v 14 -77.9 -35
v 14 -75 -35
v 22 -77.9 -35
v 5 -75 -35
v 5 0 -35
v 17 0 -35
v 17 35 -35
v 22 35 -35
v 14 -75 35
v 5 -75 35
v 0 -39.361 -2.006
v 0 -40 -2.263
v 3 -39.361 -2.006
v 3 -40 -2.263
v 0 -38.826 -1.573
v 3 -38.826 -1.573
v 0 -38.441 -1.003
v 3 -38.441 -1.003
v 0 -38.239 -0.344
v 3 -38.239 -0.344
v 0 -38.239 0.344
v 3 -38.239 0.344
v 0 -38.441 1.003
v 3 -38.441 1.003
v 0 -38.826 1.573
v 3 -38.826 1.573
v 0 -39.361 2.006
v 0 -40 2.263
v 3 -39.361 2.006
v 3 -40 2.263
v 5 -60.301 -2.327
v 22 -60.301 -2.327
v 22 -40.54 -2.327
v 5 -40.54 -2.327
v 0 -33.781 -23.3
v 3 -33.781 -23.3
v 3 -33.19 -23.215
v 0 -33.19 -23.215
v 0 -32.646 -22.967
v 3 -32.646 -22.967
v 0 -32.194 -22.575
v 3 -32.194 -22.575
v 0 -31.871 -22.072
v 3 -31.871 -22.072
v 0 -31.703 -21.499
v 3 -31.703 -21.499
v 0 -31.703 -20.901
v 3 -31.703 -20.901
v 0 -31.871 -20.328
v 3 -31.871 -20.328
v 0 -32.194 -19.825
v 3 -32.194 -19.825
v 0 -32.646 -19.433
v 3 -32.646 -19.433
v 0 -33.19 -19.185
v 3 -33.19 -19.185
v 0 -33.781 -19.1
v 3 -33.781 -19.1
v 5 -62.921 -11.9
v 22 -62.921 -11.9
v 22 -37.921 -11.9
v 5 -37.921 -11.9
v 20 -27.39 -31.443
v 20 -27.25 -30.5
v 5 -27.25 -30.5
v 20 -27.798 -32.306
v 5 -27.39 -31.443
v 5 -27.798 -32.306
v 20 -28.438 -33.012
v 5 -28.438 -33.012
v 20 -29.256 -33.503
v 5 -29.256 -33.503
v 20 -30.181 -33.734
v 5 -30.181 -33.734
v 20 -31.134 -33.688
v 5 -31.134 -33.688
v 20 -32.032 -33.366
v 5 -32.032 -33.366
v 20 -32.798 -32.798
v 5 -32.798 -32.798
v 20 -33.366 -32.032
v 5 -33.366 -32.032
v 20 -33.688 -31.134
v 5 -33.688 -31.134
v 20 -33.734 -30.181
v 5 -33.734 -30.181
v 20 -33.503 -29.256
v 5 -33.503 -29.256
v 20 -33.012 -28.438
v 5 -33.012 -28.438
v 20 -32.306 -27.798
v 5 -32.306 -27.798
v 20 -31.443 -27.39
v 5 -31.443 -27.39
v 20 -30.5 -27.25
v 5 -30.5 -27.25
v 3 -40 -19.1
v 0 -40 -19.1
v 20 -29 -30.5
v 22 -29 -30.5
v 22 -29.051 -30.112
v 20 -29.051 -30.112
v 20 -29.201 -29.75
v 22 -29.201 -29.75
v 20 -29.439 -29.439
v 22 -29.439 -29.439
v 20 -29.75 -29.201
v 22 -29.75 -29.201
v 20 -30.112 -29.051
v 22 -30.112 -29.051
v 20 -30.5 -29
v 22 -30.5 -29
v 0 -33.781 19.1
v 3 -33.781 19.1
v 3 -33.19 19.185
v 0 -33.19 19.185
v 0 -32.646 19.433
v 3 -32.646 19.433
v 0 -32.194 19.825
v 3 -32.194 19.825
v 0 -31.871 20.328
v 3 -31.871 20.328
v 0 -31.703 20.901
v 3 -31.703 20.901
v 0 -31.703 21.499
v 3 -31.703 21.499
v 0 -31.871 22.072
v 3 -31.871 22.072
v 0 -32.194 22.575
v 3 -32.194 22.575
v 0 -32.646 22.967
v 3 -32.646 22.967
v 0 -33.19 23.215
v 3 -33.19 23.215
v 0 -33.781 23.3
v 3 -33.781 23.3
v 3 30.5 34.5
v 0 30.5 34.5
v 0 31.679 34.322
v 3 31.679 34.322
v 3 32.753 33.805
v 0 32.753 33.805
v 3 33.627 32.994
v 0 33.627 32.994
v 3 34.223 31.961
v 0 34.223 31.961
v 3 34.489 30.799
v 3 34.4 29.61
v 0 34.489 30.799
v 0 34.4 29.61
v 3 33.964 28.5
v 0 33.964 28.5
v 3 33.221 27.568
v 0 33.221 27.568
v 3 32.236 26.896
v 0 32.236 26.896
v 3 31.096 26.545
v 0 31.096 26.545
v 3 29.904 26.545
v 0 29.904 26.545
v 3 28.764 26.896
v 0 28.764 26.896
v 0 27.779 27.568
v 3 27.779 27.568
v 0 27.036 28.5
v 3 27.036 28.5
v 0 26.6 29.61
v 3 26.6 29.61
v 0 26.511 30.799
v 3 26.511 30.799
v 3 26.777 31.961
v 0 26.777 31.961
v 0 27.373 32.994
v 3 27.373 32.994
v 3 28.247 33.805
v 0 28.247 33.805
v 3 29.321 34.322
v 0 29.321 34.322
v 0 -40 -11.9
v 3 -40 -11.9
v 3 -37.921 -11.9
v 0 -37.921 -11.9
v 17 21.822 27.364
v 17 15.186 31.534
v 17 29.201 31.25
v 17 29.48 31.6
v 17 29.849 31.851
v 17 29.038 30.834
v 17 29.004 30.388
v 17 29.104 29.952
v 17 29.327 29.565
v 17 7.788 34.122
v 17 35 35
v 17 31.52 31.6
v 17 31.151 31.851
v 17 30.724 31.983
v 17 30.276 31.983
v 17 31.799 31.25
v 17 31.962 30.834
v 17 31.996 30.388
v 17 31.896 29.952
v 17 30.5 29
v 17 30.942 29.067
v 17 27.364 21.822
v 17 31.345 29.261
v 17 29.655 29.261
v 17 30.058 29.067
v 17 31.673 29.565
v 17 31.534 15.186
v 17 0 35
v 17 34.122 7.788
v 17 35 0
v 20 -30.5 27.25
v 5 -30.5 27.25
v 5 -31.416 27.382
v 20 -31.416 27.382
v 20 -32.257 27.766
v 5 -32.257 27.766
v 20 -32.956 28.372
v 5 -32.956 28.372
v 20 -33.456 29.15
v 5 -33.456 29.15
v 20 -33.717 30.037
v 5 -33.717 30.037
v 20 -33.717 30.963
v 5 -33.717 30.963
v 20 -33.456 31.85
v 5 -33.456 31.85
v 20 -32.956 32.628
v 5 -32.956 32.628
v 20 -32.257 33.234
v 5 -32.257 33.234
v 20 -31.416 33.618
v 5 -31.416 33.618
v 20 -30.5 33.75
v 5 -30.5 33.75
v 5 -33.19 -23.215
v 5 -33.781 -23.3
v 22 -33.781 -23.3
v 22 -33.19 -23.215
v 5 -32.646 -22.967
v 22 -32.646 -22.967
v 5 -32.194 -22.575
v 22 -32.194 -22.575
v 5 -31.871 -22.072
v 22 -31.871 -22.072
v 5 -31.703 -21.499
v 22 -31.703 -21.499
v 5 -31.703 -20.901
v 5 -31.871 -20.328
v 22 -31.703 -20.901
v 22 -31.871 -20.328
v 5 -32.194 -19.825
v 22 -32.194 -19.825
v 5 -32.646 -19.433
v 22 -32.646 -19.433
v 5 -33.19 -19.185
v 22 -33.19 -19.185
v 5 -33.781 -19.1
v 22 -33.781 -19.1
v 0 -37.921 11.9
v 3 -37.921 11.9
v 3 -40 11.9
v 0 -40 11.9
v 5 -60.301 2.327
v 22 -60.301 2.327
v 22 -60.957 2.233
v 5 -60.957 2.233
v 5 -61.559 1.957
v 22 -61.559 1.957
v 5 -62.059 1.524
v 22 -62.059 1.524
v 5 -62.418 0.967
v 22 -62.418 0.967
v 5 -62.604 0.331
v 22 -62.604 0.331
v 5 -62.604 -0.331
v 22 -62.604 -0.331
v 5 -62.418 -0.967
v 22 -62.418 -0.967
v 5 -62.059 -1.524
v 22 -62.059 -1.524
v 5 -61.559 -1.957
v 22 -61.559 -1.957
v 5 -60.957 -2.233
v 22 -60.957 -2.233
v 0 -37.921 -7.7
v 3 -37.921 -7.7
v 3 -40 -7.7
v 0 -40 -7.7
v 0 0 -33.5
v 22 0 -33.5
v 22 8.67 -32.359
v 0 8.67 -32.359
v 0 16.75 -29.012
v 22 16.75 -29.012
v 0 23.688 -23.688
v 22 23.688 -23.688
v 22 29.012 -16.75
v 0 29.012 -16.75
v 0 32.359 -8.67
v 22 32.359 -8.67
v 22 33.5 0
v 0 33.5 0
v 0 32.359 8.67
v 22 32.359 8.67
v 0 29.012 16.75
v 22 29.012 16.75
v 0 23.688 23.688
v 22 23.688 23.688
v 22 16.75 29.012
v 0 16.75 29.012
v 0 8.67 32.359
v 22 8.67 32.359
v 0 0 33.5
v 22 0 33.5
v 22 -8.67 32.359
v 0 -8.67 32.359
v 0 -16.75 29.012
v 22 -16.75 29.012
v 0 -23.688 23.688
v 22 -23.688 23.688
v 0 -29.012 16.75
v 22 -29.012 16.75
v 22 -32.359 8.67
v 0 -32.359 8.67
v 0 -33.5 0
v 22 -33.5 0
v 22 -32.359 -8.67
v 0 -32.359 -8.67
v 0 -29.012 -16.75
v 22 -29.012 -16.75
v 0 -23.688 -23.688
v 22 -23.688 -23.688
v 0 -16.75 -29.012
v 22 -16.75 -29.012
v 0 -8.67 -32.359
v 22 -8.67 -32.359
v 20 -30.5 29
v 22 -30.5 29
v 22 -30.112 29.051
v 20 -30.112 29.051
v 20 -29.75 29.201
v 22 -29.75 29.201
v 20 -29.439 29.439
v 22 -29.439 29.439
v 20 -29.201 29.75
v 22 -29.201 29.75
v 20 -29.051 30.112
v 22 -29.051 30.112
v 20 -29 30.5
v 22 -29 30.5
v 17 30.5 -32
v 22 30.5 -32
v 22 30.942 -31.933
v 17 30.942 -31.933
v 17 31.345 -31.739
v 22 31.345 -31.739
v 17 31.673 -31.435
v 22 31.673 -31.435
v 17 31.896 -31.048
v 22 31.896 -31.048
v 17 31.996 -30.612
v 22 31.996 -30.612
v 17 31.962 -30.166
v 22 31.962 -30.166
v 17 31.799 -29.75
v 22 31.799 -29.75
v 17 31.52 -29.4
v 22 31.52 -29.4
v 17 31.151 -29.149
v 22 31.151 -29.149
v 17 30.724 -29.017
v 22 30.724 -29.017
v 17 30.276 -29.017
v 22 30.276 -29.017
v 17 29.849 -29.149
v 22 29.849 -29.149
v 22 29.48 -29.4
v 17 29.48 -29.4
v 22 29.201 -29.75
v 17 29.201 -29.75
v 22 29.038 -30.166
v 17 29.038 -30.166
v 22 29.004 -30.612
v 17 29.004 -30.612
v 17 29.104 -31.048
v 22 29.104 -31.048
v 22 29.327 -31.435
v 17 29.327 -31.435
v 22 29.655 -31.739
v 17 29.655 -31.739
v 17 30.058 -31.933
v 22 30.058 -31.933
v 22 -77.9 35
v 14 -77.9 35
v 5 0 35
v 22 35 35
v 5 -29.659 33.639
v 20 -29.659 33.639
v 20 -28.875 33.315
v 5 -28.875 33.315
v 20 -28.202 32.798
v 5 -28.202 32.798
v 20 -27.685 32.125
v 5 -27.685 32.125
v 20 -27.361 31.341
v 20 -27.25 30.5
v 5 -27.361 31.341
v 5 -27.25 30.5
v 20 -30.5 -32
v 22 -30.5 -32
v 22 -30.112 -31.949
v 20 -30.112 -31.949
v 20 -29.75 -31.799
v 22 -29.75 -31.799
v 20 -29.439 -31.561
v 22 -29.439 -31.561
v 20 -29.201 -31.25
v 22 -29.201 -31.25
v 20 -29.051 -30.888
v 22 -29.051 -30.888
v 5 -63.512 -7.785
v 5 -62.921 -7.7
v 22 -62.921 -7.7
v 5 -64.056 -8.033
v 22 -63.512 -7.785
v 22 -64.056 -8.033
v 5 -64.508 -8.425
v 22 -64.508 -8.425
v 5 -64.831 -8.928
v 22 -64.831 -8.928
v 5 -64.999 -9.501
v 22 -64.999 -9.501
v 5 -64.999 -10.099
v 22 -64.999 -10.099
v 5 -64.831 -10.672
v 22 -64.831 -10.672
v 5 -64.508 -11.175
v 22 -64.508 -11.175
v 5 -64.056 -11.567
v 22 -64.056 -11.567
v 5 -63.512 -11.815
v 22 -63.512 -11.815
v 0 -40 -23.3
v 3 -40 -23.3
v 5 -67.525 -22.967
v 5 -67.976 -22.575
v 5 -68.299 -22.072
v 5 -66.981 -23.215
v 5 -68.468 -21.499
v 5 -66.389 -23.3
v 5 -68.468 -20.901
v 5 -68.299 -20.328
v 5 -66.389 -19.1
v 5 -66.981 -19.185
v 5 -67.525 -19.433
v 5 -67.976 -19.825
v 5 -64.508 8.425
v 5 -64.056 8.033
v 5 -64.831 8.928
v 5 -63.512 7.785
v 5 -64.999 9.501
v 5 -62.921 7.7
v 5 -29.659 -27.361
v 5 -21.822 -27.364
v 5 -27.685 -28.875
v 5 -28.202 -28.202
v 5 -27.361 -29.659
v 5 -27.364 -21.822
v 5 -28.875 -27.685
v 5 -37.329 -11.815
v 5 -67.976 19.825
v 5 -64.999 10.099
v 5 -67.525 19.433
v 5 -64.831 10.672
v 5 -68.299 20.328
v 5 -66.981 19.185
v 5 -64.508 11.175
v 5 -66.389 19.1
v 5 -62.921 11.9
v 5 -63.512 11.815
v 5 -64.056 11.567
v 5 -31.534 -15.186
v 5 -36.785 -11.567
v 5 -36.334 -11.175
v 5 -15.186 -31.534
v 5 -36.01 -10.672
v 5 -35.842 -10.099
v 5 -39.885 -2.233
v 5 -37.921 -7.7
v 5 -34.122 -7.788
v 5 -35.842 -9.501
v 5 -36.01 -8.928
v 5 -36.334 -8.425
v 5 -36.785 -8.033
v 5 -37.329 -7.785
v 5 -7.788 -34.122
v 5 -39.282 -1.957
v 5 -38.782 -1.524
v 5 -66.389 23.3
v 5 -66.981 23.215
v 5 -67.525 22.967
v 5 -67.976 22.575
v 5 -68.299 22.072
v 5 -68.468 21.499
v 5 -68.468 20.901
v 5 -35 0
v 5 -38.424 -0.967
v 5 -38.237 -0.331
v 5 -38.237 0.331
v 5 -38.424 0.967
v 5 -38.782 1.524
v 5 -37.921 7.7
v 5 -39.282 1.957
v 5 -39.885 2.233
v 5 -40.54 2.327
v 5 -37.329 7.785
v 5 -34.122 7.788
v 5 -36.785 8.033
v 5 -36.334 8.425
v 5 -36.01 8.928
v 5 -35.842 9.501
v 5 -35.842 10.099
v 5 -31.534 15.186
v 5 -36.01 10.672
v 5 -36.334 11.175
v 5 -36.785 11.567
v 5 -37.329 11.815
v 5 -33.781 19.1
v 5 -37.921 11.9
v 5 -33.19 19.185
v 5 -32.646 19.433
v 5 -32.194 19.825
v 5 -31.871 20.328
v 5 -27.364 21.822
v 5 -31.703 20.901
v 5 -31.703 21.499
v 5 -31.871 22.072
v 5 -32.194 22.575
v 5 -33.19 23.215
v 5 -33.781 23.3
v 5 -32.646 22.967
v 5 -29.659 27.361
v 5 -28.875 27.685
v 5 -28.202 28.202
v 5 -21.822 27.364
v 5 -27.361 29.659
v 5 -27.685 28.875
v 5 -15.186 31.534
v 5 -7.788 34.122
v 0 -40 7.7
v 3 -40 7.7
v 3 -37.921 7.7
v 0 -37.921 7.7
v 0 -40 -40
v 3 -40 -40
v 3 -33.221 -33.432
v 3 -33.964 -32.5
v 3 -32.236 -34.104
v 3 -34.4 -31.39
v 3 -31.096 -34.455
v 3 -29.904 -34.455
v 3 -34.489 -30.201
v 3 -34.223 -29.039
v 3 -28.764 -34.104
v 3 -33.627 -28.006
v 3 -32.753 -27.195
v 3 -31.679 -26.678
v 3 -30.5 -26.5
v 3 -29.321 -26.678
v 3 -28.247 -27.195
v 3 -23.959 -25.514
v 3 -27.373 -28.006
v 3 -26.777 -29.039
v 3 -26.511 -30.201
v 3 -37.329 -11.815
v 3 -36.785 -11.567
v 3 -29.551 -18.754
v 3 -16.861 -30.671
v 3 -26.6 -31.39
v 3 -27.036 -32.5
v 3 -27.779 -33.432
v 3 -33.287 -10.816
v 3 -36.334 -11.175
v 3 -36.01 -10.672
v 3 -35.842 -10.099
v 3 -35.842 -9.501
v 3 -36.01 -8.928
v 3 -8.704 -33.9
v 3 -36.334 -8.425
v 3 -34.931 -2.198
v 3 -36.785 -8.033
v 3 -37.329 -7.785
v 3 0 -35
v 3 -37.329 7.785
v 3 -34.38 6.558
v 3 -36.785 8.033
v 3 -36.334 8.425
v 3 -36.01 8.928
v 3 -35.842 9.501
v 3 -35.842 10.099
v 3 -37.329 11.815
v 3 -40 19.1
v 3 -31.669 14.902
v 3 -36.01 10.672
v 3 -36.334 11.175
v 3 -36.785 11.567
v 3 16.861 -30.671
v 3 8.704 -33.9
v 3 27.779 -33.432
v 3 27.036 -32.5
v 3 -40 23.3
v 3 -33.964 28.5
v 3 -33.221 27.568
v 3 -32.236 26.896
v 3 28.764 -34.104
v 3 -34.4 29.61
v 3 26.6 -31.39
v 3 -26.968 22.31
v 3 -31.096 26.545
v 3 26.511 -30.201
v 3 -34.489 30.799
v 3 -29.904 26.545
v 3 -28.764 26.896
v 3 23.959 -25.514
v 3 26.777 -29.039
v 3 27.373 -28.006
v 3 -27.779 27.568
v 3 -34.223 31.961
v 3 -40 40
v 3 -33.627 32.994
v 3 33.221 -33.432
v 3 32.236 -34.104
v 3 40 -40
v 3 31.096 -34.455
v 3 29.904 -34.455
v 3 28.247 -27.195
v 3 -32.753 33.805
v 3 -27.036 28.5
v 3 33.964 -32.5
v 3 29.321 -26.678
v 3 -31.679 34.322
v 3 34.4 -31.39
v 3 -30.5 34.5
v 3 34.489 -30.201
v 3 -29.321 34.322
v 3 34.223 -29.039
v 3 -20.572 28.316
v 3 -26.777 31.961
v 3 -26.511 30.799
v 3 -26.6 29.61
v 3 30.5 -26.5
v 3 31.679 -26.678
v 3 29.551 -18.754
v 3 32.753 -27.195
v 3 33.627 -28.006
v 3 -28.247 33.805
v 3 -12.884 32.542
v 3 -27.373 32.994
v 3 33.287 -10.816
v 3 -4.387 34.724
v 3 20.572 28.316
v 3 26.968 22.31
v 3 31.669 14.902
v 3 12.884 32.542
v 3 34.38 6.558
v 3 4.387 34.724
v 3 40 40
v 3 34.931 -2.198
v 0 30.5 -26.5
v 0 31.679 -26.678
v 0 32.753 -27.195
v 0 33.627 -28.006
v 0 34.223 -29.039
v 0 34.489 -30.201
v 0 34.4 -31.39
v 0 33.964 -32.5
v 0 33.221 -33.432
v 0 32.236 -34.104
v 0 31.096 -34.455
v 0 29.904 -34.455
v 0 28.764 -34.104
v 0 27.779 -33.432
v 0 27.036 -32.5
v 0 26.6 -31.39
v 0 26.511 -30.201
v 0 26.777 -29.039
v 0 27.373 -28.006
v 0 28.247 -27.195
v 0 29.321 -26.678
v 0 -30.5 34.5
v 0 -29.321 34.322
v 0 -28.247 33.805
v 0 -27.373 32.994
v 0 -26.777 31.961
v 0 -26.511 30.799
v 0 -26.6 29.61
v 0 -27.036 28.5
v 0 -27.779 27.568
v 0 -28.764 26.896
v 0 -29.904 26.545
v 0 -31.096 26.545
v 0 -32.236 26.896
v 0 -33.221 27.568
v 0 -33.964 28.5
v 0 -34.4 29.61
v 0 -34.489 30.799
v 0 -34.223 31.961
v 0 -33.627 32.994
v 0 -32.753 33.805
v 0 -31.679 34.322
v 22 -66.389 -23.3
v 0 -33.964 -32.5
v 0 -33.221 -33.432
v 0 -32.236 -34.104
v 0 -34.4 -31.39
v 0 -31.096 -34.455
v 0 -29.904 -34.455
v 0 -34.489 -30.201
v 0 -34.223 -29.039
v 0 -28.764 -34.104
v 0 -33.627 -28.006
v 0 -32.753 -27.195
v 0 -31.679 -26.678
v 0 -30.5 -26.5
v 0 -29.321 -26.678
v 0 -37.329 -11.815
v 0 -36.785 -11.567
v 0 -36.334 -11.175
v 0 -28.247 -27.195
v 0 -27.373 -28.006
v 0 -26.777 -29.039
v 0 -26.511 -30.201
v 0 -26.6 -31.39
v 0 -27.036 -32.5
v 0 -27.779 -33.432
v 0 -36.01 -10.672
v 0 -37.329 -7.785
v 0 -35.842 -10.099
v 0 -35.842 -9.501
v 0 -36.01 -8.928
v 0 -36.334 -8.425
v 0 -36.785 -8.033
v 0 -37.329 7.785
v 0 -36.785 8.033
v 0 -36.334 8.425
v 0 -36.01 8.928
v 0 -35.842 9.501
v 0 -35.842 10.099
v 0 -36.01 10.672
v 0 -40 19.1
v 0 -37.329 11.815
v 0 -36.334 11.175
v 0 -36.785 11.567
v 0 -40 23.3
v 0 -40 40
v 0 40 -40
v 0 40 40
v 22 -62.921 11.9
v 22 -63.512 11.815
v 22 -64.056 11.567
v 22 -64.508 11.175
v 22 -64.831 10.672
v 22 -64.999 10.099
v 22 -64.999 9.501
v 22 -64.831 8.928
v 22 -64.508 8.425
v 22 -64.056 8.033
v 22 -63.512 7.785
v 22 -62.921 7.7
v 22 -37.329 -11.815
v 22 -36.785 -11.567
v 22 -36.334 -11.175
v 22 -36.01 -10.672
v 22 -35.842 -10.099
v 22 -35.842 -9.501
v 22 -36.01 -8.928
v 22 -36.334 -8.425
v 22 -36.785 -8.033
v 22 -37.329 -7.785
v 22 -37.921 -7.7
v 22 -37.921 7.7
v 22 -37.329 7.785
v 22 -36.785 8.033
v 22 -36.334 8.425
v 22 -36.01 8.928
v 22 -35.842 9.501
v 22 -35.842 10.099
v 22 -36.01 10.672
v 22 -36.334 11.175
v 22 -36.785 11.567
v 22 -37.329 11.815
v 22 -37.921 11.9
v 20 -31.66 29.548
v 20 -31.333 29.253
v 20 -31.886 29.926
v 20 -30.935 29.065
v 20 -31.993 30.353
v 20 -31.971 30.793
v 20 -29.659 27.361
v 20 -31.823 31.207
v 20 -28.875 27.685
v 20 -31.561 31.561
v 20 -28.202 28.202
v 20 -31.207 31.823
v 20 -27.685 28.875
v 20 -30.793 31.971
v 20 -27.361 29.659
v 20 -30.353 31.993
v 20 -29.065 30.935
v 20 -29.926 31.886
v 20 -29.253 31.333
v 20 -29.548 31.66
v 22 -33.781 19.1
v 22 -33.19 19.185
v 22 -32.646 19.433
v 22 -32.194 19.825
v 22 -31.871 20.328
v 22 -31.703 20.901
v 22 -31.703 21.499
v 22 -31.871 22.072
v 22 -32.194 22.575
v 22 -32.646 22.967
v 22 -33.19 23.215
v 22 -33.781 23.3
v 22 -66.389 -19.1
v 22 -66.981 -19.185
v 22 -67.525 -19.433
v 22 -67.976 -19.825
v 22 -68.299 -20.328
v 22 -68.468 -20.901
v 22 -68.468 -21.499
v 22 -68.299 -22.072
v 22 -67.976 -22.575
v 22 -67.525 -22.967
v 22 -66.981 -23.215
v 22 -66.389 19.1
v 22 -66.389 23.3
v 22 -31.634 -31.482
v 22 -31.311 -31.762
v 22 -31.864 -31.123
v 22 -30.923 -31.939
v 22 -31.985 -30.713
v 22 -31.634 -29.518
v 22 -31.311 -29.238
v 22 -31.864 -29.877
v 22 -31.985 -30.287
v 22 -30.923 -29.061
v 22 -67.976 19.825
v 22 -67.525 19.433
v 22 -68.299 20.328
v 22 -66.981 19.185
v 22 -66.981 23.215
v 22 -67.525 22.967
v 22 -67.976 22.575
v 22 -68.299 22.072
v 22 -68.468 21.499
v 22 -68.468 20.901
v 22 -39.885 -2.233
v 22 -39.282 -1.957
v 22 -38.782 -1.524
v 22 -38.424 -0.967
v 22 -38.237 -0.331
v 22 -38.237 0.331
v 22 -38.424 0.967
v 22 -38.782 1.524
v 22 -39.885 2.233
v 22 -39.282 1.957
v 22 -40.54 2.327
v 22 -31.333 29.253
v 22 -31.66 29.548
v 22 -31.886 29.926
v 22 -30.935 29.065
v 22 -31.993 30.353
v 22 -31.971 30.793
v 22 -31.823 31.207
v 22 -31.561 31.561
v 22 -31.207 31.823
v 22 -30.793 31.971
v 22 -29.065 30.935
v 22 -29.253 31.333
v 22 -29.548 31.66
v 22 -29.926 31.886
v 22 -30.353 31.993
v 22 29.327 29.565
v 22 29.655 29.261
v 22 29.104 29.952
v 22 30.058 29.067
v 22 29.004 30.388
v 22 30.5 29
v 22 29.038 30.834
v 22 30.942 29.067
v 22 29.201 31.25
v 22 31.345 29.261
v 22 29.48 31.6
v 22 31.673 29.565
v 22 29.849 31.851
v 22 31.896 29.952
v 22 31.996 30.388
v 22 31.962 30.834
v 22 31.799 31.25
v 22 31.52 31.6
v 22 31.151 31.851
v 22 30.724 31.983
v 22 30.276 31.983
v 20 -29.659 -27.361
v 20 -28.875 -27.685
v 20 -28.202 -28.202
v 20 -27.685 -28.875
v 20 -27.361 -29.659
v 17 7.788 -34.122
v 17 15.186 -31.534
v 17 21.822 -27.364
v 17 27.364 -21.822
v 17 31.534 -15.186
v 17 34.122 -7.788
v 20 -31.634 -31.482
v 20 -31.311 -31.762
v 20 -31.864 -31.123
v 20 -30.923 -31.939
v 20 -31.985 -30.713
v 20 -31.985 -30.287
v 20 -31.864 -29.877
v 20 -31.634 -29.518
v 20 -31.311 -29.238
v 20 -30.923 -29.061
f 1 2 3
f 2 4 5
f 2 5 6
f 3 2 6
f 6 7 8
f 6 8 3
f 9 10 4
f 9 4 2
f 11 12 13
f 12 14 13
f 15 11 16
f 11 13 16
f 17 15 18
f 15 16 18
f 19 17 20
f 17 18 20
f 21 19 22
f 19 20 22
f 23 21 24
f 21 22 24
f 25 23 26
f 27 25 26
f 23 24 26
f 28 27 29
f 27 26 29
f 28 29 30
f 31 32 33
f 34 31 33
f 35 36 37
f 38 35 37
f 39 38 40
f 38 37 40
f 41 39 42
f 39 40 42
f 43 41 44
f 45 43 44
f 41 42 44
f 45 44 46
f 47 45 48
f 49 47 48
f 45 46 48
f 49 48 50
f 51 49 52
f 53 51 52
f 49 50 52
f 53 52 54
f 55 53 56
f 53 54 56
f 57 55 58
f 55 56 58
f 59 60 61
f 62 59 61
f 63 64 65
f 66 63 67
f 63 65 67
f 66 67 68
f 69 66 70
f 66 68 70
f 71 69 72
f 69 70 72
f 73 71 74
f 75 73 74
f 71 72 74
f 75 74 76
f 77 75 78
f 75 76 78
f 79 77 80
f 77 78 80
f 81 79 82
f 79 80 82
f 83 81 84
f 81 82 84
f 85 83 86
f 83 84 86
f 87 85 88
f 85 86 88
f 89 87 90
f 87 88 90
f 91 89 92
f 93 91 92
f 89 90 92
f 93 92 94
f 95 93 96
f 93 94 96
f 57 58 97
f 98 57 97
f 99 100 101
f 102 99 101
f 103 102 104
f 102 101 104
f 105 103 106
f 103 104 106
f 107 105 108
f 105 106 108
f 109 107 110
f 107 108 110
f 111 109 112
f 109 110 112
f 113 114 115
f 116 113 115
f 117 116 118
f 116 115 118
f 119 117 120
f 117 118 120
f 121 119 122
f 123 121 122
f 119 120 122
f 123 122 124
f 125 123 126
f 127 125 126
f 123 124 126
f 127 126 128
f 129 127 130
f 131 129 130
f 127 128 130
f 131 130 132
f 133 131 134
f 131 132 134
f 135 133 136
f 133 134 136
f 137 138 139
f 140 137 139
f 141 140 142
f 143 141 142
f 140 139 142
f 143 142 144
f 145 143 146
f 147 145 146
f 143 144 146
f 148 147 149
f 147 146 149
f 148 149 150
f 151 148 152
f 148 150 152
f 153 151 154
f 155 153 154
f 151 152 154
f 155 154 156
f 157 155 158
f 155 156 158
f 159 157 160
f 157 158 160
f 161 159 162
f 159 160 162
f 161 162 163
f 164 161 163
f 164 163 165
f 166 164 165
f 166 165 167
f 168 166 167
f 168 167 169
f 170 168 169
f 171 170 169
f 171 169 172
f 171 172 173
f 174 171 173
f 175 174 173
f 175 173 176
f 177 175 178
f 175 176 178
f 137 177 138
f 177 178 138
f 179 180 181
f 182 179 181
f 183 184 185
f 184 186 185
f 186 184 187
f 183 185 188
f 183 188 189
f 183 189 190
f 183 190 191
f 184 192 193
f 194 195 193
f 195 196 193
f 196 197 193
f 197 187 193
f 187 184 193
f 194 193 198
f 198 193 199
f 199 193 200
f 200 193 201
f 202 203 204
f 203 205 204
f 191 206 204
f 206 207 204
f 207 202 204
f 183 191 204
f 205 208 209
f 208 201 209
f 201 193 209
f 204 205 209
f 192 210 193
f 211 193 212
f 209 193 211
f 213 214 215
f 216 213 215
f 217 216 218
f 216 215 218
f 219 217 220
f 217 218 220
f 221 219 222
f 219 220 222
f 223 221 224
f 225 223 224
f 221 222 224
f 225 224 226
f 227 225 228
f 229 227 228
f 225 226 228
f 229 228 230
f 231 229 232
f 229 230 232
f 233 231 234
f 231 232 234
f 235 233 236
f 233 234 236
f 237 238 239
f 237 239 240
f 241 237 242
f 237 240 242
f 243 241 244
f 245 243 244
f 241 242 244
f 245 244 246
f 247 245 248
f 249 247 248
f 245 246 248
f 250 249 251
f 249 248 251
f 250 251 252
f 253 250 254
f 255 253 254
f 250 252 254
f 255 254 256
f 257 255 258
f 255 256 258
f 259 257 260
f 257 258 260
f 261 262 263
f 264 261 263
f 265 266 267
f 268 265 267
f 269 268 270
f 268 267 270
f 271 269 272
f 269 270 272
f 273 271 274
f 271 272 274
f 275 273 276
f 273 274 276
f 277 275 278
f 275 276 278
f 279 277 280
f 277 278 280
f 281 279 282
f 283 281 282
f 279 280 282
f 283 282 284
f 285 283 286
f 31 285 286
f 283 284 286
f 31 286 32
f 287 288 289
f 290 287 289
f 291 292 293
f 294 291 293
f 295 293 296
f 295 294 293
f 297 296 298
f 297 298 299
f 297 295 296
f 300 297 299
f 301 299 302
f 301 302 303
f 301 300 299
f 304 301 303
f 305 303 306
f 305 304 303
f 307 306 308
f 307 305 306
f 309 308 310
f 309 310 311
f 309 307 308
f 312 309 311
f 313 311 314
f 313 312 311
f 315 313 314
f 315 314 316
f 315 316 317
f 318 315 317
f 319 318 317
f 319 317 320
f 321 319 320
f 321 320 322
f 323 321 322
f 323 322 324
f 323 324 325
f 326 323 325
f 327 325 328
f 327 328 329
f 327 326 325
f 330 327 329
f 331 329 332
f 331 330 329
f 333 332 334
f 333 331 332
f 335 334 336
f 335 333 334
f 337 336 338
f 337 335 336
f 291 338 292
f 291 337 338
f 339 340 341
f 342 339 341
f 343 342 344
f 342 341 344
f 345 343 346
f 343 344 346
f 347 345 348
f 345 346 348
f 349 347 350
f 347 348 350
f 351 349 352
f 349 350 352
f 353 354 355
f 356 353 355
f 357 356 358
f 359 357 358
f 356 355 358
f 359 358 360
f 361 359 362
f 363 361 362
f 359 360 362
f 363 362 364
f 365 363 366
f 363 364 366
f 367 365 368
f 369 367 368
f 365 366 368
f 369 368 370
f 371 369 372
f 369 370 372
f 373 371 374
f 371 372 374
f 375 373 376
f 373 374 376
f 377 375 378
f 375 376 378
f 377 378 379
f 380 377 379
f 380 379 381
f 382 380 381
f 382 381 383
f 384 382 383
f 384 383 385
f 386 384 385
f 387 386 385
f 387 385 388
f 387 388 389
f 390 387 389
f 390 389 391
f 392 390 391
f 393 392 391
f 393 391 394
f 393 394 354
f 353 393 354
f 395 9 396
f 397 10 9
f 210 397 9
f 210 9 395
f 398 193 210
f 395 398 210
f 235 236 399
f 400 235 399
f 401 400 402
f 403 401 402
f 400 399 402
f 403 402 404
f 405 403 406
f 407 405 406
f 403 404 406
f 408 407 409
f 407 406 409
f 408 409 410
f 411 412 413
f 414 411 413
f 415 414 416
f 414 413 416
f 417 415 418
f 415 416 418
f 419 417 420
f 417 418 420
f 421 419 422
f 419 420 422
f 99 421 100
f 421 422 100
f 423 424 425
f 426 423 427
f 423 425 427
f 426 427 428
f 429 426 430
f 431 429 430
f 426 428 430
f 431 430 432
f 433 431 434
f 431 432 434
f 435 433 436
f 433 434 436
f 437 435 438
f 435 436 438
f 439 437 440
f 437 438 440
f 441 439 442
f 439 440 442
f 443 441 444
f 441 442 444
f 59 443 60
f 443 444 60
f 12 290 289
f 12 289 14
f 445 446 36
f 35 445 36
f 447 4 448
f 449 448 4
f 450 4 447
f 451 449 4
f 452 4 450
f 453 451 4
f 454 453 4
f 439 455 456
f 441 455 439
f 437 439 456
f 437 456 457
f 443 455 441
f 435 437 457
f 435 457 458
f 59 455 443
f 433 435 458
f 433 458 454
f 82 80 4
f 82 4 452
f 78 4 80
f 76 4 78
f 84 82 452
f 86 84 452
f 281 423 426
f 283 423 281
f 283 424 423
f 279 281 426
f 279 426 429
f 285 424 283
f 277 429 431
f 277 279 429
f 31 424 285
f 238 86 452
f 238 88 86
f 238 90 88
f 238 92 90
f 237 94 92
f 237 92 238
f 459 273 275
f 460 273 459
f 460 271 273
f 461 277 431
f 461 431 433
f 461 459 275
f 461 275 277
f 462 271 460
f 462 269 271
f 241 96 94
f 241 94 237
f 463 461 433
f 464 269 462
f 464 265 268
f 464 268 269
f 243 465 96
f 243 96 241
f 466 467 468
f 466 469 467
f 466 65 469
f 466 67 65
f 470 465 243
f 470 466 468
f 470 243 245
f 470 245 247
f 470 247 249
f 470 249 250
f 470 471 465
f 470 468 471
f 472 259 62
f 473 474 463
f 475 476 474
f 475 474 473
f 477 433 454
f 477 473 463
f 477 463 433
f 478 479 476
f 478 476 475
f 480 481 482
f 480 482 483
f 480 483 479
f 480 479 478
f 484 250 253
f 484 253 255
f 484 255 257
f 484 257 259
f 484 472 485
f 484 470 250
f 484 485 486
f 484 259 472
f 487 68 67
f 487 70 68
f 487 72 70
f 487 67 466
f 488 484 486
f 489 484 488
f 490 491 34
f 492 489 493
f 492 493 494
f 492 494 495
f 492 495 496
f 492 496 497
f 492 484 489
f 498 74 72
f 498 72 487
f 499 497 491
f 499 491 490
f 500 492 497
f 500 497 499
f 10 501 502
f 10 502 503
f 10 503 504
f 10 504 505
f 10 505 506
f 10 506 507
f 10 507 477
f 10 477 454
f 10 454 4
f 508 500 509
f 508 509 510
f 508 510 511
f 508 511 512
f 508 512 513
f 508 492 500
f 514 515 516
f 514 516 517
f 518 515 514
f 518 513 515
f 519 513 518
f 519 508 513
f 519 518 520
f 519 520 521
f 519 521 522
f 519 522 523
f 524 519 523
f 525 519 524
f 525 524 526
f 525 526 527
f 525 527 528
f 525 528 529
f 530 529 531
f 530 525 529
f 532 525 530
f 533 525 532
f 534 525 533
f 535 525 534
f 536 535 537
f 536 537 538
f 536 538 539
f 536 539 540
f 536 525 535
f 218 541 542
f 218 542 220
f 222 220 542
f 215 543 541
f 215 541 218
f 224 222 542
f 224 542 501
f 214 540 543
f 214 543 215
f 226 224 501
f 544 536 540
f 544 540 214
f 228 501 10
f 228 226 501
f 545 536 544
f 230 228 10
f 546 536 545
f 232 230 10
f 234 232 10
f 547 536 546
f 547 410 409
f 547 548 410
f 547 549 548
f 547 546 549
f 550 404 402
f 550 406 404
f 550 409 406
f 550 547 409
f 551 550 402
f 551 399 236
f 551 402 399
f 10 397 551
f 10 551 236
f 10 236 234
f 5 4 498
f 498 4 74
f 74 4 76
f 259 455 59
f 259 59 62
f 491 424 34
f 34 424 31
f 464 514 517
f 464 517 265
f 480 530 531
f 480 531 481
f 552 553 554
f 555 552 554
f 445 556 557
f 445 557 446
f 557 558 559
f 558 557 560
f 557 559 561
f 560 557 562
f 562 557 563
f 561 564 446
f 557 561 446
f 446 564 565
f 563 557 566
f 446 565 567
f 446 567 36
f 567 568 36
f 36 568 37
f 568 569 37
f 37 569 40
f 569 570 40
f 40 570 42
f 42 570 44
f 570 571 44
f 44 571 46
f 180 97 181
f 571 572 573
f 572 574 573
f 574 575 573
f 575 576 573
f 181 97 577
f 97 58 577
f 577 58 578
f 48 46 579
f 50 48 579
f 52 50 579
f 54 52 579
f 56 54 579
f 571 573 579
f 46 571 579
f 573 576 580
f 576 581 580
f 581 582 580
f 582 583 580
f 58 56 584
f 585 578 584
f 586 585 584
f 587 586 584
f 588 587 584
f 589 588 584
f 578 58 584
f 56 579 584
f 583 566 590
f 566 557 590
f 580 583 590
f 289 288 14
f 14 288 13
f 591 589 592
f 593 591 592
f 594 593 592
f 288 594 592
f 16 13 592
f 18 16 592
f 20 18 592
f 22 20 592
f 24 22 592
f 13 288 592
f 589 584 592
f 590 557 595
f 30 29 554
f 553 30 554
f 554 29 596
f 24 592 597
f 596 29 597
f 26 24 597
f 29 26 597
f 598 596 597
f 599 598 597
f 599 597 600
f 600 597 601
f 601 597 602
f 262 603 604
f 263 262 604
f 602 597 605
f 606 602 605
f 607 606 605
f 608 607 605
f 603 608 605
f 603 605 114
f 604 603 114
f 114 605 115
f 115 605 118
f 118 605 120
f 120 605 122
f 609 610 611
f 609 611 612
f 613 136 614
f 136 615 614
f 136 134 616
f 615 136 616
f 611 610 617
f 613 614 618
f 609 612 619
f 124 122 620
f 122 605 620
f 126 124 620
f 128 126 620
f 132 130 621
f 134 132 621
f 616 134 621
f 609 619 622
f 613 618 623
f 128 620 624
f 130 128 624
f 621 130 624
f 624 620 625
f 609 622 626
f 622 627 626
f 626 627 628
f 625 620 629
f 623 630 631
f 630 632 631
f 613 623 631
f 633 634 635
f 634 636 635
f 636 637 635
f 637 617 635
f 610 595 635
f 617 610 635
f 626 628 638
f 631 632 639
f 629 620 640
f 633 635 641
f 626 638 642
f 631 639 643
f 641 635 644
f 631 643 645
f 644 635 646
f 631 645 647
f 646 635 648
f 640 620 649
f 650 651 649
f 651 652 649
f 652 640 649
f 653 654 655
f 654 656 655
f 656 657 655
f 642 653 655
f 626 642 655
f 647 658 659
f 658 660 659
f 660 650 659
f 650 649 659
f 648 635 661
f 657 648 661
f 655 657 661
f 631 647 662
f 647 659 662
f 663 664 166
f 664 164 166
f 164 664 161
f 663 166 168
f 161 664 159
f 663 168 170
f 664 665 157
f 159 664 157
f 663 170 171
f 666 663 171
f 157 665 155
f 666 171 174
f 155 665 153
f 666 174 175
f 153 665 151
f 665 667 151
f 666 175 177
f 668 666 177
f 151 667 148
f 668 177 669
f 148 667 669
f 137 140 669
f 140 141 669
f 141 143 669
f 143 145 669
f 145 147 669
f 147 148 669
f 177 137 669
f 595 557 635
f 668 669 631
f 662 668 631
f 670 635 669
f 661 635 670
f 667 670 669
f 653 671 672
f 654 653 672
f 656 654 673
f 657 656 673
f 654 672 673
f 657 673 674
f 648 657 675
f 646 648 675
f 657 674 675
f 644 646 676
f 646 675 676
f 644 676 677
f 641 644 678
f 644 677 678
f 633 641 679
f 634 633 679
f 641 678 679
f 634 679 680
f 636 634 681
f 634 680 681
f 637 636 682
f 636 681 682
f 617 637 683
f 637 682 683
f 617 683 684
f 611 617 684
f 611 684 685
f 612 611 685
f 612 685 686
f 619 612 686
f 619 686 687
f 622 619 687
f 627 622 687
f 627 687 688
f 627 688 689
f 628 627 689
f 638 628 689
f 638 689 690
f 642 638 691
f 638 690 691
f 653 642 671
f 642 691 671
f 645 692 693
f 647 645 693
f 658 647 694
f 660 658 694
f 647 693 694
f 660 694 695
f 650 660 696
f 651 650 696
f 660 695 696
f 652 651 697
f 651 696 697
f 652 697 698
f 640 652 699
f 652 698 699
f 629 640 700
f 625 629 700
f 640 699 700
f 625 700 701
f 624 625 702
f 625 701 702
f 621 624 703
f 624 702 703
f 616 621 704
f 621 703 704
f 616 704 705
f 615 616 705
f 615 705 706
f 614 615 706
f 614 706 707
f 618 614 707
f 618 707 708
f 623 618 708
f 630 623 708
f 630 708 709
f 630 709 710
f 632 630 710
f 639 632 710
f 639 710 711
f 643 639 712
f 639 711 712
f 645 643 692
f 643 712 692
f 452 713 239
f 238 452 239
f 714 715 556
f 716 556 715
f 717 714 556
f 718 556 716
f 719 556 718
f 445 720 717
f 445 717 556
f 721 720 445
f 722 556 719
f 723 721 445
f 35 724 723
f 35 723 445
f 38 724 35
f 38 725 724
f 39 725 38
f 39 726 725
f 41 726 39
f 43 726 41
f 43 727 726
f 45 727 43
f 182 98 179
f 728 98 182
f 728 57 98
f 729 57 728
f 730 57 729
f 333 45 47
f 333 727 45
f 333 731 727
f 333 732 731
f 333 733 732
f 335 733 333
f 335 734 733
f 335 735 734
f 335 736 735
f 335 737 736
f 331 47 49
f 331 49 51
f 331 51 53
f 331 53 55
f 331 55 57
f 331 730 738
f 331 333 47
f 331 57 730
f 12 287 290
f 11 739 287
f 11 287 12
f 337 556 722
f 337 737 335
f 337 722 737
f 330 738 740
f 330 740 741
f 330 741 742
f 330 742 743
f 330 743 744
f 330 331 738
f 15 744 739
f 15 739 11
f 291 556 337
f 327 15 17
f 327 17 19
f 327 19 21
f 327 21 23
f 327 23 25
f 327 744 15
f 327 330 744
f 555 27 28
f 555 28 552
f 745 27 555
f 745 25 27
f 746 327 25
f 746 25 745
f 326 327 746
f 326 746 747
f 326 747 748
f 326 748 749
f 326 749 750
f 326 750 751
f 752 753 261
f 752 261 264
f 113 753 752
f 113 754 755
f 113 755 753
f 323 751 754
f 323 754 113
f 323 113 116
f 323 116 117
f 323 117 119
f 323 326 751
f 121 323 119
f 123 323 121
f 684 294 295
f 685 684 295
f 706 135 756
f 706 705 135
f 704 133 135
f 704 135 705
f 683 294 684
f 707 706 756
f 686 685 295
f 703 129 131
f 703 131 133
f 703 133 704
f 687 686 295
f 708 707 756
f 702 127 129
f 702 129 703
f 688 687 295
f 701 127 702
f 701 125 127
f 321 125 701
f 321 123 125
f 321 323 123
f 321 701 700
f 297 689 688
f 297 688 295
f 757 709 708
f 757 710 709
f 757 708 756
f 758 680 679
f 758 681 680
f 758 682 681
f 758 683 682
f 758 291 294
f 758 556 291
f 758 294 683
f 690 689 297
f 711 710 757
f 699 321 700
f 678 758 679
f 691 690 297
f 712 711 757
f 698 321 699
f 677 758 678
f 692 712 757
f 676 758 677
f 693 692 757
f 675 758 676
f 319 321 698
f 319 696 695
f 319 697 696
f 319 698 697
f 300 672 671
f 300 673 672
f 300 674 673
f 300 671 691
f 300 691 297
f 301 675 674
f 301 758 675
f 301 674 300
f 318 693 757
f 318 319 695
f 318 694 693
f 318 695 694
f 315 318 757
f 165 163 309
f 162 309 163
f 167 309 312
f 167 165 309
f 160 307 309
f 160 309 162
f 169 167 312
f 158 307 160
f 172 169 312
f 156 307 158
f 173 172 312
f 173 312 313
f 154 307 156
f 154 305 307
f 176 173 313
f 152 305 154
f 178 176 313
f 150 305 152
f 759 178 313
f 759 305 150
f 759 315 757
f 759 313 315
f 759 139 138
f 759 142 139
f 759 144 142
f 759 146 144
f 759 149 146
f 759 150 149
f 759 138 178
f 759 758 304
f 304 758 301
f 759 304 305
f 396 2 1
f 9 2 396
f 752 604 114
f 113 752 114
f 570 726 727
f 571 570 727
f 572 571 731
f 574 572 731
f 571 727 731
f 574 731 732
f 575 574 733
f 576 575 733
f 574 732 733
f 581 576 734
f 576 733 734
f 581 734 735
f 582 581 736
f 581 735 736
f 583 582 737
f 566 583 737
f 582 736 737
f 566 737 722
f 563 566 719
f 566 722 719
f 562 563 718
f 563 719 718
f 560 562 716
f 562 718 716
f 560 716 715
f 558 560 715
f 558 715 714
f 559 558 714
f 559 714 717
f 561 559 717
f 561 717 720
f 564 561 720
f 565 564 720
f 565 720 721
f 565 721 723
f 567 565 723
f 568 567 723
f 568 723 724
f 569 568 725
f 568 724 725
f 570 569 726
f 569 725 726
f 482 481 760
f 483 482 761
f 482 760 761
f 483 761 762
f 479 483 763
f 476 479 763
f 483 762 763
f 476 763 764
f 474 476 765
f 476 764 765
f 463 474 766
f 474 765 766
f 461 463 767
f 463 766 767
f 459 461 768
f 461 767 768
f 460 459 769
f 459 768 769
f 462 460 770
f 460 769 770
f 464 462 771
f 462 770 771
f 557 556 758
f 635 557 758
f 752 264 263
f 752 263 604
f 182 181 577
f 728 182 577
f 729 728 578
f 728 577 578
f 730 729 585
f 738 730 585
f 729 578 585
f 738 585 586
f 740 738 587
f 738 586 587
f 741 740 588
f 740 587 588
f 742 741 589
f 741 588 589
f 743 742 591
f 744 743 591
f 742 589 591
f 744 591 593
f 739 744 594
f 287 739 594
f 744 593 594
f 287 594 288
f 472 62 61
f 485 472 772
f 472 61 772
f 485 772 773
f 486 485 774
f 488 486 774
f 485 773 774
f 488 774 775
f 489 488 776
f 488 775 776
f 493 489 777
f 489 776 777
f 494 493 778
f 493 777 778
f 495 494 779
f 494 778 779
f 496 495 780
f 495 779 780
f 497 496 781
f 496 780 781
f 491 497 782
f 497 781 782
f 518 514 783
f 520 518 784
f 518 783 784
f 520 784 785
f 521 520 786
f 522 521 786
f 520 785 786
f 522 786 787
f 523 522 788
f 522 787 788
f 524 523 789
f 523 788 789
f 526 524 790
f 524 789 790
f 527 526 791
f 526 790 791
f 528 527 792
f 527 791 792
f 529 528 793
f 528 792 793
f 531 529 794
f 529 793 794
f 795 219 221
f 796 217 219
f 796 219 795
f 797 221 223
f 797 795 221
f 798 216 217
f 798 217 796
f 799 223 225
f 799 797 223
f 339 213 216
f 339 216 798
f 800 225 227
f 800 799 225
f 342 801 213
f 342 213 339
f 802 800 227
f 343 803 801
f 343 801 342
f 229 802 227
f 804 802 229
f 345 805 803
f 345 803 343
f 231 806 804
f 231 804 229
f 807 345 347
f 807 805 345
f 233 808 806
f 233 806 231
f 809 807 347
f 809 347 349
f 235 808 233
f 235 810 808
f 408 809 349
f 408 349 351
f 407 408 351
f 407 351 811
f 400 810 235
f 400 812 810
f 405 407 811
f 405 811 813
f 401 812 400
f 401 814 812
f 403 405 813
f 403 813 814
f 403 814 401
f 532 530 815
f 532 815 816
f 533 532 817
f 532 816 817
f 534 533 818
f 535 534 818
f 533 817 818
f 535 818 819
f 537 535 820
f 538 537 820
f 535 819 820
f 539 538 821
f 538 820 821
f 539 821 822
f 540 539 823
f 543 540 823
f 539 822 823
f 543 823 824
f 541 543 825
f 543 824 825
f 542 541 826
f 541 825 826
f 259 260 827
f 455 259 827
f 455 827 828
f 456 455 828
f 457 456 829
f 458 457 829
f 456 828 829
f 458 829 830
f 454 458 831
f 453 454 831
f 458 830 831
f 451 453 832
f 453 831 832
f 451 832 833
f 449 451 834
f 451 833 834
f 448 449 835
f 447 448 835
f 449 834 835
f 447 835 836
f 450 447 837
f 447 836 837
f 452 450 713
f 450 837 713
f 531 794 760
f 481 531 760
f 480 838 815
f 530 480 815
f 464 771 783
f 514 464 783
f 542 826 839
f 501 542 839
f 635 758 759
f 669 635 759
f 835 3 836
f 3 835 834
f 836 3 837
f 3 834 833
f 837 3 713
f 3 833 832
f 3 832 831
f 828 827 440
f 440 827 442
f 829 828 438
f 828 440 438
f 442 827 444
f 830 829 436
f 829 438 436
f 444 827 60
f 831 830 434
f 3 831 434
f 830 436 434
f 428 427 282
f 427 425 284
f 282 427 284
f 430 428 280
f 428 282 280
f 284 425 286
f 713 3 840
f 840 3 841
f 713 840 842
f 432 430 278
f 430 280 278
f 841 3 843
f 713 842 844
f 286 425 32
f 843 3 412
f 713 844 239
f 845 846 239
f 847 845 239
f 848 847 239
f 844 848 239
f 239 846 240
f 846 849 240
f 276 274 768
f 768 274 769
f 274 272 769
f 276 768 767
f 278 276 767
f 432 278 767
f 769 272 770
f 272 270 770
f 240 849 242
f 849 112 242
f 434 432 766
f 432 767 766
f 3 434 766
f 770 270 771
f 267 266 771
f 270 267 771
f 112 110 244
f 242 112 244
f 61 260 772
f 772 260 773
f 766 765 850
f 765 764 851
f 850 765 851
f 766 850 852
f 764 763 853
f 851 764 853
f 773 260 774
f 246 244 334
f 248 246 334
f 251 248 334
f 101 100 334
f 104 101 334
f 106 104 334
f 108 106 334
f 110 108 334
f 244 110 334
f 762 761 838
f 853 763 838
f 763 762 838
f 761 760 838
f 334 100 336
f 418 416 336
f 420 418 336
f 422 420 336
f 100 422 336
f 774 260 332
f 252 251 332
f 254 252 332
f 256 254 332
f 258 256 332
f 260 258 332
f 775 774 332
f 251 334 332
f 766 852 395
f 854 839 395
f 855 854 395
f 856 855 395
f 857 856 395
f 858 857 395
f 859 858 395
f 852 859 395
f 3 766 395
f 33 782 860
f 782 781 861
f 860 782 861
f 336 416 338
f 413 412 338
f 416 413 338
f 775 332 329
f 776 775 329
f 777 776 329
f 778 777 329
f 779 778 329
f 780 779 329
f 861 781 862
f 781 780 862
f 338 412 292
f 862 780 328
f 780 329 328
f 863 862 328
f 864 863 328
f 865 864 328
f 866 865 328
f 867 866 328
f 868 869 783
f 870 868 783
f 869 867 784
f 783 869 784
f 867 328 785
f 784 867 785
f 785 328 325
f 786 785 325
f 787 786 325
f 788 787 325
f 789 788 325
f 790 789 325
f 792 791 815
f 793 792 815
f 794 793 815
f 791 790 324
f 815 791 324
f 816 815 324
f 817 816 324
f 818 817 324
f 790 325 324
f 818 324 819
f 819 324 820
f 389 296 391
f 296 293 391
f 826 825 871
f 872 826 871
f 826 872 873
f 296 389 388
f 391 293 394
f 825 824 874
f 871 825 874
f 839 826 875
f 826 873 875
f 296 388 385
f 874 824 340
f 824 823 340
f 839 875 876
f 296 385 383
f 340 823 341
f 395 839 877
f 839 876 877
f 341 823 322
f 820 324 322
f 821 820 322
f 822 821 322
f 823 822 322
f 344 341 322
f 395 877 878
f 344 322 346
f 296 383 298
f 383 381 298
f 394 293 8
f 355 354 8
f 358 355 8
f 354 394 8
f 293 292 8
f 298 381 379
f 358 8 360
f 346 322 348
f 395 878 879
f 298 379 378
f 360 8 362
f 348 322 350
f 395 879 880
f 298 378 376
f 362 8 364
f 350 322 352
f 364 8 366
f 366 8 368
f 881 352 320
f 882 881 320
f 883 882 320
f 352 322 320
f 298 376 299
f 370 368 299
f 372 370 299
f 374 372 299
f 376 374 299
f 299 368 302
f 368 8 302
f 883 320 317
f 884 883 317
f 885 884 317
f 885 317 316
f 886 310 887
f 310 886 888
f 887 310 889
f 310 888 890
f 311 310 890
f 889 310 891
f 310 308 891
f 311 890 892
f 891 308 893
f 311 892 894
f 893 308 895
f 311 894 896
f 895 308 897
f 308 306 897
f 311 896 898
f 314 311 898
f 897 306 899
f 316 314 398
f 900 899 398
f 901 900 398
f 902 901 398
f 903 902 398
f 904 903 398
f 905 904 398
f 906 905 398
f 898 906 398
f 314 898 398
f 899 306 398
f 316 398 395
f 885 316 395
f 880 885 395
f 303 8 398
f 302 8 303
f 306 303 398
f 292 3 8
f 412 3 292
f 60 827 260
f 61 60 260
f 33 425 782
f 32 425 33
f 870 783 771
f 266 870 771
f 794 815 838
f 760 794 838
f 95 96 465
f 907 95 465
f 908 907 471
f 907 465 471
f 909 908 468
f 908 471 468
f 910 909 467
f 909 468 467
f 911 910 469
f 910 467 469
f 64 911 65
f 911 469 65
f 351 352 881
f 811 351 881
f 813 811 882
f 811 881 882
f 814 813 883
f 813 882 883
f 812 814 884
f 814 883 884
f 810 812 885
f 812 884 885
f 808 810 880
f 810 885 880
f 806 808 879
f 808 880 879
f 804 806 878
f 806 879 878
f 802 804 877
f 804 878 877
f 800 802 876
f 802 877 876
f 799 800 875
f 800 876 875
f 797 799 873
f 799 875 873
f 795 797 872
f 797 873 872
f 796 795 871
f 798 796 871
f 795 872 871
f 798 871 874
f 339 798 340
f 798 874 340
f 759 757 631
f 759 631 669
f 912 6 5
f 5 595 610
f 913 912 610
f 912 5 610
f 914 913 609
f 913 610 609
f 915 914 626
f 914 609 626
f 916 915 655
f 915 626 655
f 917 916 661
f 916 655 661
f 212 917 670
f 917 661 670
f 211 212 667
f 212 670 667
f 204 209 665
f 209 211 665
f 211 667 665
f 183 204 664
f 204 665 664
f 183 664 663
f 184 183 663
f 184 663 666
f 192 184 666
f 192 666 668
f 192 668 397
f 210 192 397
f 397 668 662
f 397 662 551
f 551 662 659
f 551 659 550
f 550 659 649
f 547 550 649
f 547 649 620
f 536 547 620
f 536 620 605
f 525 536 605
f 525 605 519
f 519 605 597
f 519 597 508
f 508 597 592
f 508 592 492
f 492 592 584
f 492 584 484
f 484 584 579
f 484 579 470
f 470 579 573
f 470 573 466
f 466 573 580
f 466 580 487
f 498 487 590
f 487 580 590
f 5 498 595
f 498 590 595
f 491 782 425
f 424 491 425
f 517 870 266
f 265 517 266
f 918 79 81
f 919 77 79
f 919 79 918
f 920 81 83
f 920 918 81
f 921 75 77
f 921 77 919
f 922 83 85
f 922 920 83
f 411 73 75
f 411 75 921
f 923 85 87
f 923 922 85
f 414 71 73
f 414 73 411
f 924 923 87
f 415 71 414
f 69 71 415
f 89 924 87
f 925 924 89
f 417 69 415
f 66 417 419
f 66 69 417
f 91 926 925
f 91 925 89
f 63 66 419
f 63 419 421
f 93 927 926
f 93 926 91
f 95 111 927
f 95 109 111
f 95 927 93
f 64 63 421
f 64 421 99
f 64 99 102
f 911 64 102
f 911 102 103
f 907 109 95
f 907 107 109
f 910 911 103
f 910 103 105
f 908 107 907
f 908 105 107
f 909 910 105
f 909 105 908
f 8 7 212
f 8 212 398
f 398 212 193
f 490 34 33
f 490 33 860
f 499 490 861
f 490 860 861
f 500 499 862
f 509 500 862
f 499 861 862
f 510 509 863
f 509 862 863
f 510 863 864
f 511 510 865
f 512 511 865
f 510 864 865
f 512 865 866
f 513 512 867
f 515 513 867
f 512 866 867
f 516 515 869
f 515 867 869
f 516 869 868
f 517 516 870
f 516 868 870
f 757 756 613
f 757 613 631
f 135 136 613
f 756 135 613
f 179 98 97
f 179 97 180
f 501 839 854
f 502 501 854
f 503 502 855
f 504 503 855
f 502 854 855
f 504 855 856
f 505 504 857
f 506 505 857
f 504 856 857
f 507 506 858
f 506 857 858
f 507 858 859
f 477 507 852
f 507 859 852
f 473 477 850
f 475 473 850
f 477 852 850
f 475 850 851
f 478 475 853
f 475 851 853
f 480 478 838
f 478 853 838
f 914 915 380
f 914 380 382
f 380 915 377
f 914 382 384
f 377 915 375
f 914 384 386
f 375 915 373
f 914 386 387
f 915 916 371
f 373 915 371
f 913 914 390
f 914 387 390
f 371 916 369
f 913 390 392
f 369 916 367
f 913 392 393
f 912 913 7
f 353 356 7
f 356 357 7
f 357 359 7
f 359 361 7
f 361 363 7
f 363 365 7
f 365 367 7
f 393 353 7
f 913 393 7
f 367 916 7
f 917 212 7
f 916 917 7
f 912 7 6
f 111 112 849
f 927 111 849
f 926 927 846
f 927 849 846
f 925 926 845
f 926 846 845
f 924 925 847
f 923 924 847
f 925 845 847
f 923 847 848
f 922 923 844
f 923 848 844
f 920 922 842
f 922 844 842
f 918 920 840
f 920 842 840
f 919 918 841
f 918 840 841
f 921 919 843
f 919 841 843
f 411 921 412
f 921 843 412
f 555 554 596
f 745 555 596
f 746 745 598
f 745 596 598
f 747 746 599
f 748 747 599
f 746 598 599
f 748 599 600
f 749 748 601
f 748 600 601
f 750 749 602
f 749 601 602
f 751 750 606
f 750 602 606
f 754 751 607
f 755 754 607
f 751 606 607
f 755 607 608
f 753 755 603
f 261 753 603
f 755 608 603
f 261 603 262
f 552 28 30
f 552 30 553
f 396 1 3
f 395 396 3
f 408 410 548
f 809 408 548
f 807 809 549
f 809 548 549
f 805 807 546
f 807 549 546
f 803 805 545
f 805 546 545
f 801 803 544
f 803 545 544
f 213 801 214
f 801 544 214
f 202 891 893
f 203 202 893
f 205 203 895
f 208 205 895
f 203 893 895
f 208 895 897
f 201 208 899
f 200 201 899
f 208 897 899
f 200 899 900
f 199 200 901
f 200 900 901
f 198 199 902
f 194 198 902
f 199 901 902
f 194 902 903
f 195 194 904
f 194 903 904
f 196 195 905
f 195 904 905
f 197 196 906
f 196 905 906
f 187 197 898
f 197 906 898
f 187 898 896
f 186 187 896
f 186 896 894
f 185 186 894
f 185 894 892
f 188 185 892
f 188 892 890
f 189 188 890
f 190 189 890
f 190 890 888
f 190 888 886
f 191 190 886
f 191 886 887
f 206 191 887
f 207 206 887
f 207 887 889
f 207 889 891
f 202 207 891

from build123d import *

# Parameters (mm, degrees)
SKETCH_1_R          = 35
SKETCH_1_R_2        = 33.5
EXTRUDE_1_DEPTH     = 22
EXTRUDE_START       = -17
EXTRUDE_2_DEPTH     = 17
EXTRUDE_START_2     = -5
EXTRUDE_3_DEPTH     = 5
SKETCH_9_W          = 17
SKETCH_9_H          = 70
EXTRUDE_4_DEPTH     = 5
SKETCH_10_W         = 8
SKETCH_10_H         = 70
EXTRUDE_5_DEPTH     = 2.9
SKETCH_12_W         = 80
SKETCH_12_H         = 80
SKETCH_12_R         = 35
EXTRUDE_7_DEPTH     = 3
SKETCH_3_R          = 1.5
CUT_EXTRUDE_1_DEPTH = 30
CUT_EXTRUDE_3_DEPTH = 15
CUT_EXTRUDE_4_DEPTH = 30
SKETCH_13_R         = 4
CUT_EXTRUDE_5_DEPTH = 3


with BuildPart() as part:
    # 草图1 → 凸台-拉伸1 (new body)
    with BuildSketch(Plane(origin=(0, 0, 0), x_dir=(0, 0, -1), z_dir=(1, 0, 0))):
        Circle(SKETCH_1_R)
        Circle(SKETCH_1_R_2, mode=Mode.SUBTRACT)
    extrude(amount=EXTRUDE_1_DEPTH)

    # 草图2 → 凸台-拉伸2 (add)
    with BuildSketch(Plane(origin=(22, 0, 0), x_dir=(0, 0, -1), z_dir=(1, 0, 0)).offset(EXTRUDE_START)):
        with BuildLine():
            Line((0, -70), (0, -35))
            ThreePointArc((0, -35), (-24.748737342, -24.748737342), (-35, 0))
            Line((-35, 0), (-35, -70))
            Line((-35, -70), (0, -70))
        make_face()
        with BuildLine():
            ThreePointArc((35, 0), (24.748737342, -24.748737342), (0, -35))
            Line((0, -35), (0, -70))
            Line((0, -70), (35, -70))
            Line((35, -70), (35, 0))
        make_face()
    extrude(amount=EXTRUDE_2_DEPTH)

    # 草图4 → 凸台-拉伸3 (add)
    with BuildSketch(Plane(origin=(22, 0, 0), x_dir=(0, 0, -1), z_dir=(1, 0, 0)).offset(EXTRUDE_START_2)):
        with BuildLine():
            Line((35, 35), (0, 35))
            ThreePointArc((0, 35), (24.748737342, 24.748737342), (35, 0))
            Line((35, 0), (35, 35))
        make_face()
        with BuildLine():
            Line((-35, 35), (-35, 0))
            ThreePointArc((-35, 0), (-24.748737342, 24.748737342), (0, 35))
            Line((0, 35), (-35, 35))
        make_face()
    extrude(amount=EXTRUDE_3_DEPTH)

    # 草图9 → 凸台-拉伸4 (add)
    with BuildSketch(Plane.XZ.offset(70)):
        with Locations((13.5, 0)):
            Rectangle(SKETCH_9_W, SKETCH_9_H)
    extrude(amount=EXTRUDE_4_DEPTH)

    # 草图10 → 凸台-拉伸5 (add)
    with BuildSketch(Plane.XZ.offset(75)):
        with Locations((18, 0)):
            Rectangle(SKETCH_10_W, SKETCH_10_H)
    extrude(amount=EXTRUDE_5_DEPTH)

    # 草图12 → 凸台-拉伸7 (add)
    with BuildSketch(Plane.ZY):
        Rectangle(SKETCH_12_W, SKETCH_12_H)
        Circle(SKETCH_12_R, mode=Mode.SUBTRACT)
    extrude(amount=-EXTRUDE_7_DEPTH)

    # 草图3 → 切除-拉伸1 (cut)
    with BuildSketch(Plane(origin=(22, 0, 0), x_dir=(0, 0, -1), z_dir=(1, 0, 0))):
        with BuildLine():
            Line((-30.5, -29), (-30.5, -30.5))
            Line((-30.5, -30.5), (-29, -30.5))
            ThreePointArc((-29, -30.5), (-29.439339828, -29.439339828), (-30.5, -29))
        make_face()
        with BuildLine():
            Line((-29, -30.5), (-30.5, -30.5))
            Line((-30.5, -30.5), (-30.5, -29))
            ThreePointArc((-30.5, -29), (-31.560660172, -31.560660172), (-29, -30.5))
        make_face()
        with BuildLine():
            ThreePointArc((30.5, -29), (29.439339828, -29.439339828), (29, -30.5))
            Line((29, -30.5), (30.5, -30.5))
            Line((30.5, -30.5), (30.5, -29))
        make_face()
        with BuildLine():
            Line((30.5, -30.5), (29, -30.5))
            ThreePointArc((29, -30.5), (30.5, -32), (32, -30.5))
            ThreePointArc((32, -30.5), (31.560660172, -29.439339828), (30.5, -29))
            Line((30.5, -29), (30.5, -30.5))
        make_face()
        with Locations((-30.5, 30.5)):
            Circle(SKETCH_3_R)
        with Locations((30.5, 30.5)):
            Circle(SKETCH_3_R)
    extrude(amount=-CUT_EXTRUDE_1_DEPTH, mode=Mode.SUBTRACT)

    # 草图7 → 切除-拉伸3 (cut)
    with BuildSketch(Plane.ZY.offset(-5)):
        with BuildLine():
            ThreePointArc((-27.25, -30.5), (-28.201902961, -28.201902961), (-30.5, -27.25))
            Line((-30.5, -27.25), (-30.5, -30.5))
            Line((-30.5, -30.5), (-27.25, -30.5))
        make_face()
        with BuildLine():
            Line((-30.5, -30.5), (-30.5, -27.25))
            ThreePointArc((-30.5, -27.25), (-32.798097039, -32.798097039), (-27.25, -30.5))
            Line((-27.25, -30.5), (-30.5, -30.5))
        make_face()
        with BuildLine():
            ThreePointArc((33.75, -30.5), (32.798097039, -28.201902961), (30.5, -27.25))
            Line((30.5, -27.25), (30.5, -30.5))
            Line((30.5, -30.5), (27.25, -30.5))
            ThreePointArc((27.25, -30.5), (30.5, -33.75), (33.75, -30.5))
        make_face()
        with BuildLine():
            Line((30.5, -30.5), (30.5, -27.25))
            ThreePointArc((30.5, -27.25), (28.201902961, -28.201902961), (27.25, -30.5))
            Line((27.25, -30.5), (30.5, -30.5))
        make_face()
    extrude(amount=-CUT_EXTRUDE_3_DEPTH, mode=Mode.SUBTRACT)

    # 草图8 → 切除-拉伸4 (cut)
    with BuildSketch(Plane(origin=(22, 0, 0), x_dir=(0, 0, -1), z_dir=(1, 0, 0))):
        with BuildLine():
            Line((-19.1, -66.389218309), (-19.1, -33.781302014))
            ThreePointArc((-19.1, -33.781302014), (-21.2, -31.681302014), (-23.3, -33.781302014))
            Line((-23.3, -33.781302014), (-23.3, -66.389218309))
            ThreePointArc((-23.3, -66.389218309), (-21.2, -68.489218309), (-19.1, -66.389218309))
        make_face()
        with BuildLine():
            Line((23.3, -66.389218309), (23.3, -33.781302014))
            ThreePointArc((23.3, -33.781302014), (21.2, -31.681302014), (19.1, -33.781302014))
            Line((19.1, -33.781302014), (19.1, -66.389218309))
            ThreePointArc((19.1, -66.389218309), (21.2, -68.489218309), (23.3, -66.389218309))
        make_face()
        with BuildLine():
            Line((-7.7, -62.920659131), (-7.7, -50.420659131))
            Line((-7.7, -50.420659131), (-7.7, -37.920659131))
            ThreePointArc((-7.7, -37.920659131), (-9.8, -35.820659131), (-11.9, -37.920659131))
            Line((-11.9, -37.920659131), (-11.9, -62.920659131))
            ThreePointArc((-11.9, -62.920659131), (-9.8, -65.020659131), (-7.7, -62.920659131))
        make_face()
        with BuildLine():
            Line((2.32685582, -60.300961988), (2.32685582, -40.540356273))
            ThreePointArc((2.32685582, -40.540356273), (0, -38.213500453), (-2.32685582, -40.540356273))
            Line((-2.32685582, -40.540356273), (-2.32685582, -60.300961988))
            ThreePointArc((-2.32685582, -60.300961988), (0, -62.627817808), (2.32685582, -60.300961988))
        make_face()
        with BuildLine():
            Line((11.9, -62.920659131), (11.9, -37.920659131))
            ThreePointArc((11.9, -37.920659131), (9.8, -35.820659131), (7.7, -37.920659131))
            Line((7.7, -37.920659131), (7.7, -50.420659131))
            Line((7.7, -50.420659131), (7.7, -62.920659131))
            ThreePointArc((7.7, -62.920659131), (9.8, -65.020659131), (11.9, -62.920659131))
        make_face()
    extrude(amount=-CUT_EXTRUDE_4_DEPTH, mode=Mode.SUBTRACT)

    # 草图13 → 切除-拉伸5 (cut)
    with BuildSketch(Plane.ZY):
        with Locations((-30.5, -30.5)):
            Circle(SKETCH_13_R)
        with Locations((30.5, -30.5)):
            Circle(SKETCH_13_R)
        with Locations((-30.5, 30.5)):
            Circle(SKETCH_13_R)
        with Locations((30.5, 30.5)):
            Circle(SKETCH_13_R)
    extrude(amount=-CUT_EXTRUDE_5_DEPTH, mode=Mode.SUBTRACT)


solid = part.part
